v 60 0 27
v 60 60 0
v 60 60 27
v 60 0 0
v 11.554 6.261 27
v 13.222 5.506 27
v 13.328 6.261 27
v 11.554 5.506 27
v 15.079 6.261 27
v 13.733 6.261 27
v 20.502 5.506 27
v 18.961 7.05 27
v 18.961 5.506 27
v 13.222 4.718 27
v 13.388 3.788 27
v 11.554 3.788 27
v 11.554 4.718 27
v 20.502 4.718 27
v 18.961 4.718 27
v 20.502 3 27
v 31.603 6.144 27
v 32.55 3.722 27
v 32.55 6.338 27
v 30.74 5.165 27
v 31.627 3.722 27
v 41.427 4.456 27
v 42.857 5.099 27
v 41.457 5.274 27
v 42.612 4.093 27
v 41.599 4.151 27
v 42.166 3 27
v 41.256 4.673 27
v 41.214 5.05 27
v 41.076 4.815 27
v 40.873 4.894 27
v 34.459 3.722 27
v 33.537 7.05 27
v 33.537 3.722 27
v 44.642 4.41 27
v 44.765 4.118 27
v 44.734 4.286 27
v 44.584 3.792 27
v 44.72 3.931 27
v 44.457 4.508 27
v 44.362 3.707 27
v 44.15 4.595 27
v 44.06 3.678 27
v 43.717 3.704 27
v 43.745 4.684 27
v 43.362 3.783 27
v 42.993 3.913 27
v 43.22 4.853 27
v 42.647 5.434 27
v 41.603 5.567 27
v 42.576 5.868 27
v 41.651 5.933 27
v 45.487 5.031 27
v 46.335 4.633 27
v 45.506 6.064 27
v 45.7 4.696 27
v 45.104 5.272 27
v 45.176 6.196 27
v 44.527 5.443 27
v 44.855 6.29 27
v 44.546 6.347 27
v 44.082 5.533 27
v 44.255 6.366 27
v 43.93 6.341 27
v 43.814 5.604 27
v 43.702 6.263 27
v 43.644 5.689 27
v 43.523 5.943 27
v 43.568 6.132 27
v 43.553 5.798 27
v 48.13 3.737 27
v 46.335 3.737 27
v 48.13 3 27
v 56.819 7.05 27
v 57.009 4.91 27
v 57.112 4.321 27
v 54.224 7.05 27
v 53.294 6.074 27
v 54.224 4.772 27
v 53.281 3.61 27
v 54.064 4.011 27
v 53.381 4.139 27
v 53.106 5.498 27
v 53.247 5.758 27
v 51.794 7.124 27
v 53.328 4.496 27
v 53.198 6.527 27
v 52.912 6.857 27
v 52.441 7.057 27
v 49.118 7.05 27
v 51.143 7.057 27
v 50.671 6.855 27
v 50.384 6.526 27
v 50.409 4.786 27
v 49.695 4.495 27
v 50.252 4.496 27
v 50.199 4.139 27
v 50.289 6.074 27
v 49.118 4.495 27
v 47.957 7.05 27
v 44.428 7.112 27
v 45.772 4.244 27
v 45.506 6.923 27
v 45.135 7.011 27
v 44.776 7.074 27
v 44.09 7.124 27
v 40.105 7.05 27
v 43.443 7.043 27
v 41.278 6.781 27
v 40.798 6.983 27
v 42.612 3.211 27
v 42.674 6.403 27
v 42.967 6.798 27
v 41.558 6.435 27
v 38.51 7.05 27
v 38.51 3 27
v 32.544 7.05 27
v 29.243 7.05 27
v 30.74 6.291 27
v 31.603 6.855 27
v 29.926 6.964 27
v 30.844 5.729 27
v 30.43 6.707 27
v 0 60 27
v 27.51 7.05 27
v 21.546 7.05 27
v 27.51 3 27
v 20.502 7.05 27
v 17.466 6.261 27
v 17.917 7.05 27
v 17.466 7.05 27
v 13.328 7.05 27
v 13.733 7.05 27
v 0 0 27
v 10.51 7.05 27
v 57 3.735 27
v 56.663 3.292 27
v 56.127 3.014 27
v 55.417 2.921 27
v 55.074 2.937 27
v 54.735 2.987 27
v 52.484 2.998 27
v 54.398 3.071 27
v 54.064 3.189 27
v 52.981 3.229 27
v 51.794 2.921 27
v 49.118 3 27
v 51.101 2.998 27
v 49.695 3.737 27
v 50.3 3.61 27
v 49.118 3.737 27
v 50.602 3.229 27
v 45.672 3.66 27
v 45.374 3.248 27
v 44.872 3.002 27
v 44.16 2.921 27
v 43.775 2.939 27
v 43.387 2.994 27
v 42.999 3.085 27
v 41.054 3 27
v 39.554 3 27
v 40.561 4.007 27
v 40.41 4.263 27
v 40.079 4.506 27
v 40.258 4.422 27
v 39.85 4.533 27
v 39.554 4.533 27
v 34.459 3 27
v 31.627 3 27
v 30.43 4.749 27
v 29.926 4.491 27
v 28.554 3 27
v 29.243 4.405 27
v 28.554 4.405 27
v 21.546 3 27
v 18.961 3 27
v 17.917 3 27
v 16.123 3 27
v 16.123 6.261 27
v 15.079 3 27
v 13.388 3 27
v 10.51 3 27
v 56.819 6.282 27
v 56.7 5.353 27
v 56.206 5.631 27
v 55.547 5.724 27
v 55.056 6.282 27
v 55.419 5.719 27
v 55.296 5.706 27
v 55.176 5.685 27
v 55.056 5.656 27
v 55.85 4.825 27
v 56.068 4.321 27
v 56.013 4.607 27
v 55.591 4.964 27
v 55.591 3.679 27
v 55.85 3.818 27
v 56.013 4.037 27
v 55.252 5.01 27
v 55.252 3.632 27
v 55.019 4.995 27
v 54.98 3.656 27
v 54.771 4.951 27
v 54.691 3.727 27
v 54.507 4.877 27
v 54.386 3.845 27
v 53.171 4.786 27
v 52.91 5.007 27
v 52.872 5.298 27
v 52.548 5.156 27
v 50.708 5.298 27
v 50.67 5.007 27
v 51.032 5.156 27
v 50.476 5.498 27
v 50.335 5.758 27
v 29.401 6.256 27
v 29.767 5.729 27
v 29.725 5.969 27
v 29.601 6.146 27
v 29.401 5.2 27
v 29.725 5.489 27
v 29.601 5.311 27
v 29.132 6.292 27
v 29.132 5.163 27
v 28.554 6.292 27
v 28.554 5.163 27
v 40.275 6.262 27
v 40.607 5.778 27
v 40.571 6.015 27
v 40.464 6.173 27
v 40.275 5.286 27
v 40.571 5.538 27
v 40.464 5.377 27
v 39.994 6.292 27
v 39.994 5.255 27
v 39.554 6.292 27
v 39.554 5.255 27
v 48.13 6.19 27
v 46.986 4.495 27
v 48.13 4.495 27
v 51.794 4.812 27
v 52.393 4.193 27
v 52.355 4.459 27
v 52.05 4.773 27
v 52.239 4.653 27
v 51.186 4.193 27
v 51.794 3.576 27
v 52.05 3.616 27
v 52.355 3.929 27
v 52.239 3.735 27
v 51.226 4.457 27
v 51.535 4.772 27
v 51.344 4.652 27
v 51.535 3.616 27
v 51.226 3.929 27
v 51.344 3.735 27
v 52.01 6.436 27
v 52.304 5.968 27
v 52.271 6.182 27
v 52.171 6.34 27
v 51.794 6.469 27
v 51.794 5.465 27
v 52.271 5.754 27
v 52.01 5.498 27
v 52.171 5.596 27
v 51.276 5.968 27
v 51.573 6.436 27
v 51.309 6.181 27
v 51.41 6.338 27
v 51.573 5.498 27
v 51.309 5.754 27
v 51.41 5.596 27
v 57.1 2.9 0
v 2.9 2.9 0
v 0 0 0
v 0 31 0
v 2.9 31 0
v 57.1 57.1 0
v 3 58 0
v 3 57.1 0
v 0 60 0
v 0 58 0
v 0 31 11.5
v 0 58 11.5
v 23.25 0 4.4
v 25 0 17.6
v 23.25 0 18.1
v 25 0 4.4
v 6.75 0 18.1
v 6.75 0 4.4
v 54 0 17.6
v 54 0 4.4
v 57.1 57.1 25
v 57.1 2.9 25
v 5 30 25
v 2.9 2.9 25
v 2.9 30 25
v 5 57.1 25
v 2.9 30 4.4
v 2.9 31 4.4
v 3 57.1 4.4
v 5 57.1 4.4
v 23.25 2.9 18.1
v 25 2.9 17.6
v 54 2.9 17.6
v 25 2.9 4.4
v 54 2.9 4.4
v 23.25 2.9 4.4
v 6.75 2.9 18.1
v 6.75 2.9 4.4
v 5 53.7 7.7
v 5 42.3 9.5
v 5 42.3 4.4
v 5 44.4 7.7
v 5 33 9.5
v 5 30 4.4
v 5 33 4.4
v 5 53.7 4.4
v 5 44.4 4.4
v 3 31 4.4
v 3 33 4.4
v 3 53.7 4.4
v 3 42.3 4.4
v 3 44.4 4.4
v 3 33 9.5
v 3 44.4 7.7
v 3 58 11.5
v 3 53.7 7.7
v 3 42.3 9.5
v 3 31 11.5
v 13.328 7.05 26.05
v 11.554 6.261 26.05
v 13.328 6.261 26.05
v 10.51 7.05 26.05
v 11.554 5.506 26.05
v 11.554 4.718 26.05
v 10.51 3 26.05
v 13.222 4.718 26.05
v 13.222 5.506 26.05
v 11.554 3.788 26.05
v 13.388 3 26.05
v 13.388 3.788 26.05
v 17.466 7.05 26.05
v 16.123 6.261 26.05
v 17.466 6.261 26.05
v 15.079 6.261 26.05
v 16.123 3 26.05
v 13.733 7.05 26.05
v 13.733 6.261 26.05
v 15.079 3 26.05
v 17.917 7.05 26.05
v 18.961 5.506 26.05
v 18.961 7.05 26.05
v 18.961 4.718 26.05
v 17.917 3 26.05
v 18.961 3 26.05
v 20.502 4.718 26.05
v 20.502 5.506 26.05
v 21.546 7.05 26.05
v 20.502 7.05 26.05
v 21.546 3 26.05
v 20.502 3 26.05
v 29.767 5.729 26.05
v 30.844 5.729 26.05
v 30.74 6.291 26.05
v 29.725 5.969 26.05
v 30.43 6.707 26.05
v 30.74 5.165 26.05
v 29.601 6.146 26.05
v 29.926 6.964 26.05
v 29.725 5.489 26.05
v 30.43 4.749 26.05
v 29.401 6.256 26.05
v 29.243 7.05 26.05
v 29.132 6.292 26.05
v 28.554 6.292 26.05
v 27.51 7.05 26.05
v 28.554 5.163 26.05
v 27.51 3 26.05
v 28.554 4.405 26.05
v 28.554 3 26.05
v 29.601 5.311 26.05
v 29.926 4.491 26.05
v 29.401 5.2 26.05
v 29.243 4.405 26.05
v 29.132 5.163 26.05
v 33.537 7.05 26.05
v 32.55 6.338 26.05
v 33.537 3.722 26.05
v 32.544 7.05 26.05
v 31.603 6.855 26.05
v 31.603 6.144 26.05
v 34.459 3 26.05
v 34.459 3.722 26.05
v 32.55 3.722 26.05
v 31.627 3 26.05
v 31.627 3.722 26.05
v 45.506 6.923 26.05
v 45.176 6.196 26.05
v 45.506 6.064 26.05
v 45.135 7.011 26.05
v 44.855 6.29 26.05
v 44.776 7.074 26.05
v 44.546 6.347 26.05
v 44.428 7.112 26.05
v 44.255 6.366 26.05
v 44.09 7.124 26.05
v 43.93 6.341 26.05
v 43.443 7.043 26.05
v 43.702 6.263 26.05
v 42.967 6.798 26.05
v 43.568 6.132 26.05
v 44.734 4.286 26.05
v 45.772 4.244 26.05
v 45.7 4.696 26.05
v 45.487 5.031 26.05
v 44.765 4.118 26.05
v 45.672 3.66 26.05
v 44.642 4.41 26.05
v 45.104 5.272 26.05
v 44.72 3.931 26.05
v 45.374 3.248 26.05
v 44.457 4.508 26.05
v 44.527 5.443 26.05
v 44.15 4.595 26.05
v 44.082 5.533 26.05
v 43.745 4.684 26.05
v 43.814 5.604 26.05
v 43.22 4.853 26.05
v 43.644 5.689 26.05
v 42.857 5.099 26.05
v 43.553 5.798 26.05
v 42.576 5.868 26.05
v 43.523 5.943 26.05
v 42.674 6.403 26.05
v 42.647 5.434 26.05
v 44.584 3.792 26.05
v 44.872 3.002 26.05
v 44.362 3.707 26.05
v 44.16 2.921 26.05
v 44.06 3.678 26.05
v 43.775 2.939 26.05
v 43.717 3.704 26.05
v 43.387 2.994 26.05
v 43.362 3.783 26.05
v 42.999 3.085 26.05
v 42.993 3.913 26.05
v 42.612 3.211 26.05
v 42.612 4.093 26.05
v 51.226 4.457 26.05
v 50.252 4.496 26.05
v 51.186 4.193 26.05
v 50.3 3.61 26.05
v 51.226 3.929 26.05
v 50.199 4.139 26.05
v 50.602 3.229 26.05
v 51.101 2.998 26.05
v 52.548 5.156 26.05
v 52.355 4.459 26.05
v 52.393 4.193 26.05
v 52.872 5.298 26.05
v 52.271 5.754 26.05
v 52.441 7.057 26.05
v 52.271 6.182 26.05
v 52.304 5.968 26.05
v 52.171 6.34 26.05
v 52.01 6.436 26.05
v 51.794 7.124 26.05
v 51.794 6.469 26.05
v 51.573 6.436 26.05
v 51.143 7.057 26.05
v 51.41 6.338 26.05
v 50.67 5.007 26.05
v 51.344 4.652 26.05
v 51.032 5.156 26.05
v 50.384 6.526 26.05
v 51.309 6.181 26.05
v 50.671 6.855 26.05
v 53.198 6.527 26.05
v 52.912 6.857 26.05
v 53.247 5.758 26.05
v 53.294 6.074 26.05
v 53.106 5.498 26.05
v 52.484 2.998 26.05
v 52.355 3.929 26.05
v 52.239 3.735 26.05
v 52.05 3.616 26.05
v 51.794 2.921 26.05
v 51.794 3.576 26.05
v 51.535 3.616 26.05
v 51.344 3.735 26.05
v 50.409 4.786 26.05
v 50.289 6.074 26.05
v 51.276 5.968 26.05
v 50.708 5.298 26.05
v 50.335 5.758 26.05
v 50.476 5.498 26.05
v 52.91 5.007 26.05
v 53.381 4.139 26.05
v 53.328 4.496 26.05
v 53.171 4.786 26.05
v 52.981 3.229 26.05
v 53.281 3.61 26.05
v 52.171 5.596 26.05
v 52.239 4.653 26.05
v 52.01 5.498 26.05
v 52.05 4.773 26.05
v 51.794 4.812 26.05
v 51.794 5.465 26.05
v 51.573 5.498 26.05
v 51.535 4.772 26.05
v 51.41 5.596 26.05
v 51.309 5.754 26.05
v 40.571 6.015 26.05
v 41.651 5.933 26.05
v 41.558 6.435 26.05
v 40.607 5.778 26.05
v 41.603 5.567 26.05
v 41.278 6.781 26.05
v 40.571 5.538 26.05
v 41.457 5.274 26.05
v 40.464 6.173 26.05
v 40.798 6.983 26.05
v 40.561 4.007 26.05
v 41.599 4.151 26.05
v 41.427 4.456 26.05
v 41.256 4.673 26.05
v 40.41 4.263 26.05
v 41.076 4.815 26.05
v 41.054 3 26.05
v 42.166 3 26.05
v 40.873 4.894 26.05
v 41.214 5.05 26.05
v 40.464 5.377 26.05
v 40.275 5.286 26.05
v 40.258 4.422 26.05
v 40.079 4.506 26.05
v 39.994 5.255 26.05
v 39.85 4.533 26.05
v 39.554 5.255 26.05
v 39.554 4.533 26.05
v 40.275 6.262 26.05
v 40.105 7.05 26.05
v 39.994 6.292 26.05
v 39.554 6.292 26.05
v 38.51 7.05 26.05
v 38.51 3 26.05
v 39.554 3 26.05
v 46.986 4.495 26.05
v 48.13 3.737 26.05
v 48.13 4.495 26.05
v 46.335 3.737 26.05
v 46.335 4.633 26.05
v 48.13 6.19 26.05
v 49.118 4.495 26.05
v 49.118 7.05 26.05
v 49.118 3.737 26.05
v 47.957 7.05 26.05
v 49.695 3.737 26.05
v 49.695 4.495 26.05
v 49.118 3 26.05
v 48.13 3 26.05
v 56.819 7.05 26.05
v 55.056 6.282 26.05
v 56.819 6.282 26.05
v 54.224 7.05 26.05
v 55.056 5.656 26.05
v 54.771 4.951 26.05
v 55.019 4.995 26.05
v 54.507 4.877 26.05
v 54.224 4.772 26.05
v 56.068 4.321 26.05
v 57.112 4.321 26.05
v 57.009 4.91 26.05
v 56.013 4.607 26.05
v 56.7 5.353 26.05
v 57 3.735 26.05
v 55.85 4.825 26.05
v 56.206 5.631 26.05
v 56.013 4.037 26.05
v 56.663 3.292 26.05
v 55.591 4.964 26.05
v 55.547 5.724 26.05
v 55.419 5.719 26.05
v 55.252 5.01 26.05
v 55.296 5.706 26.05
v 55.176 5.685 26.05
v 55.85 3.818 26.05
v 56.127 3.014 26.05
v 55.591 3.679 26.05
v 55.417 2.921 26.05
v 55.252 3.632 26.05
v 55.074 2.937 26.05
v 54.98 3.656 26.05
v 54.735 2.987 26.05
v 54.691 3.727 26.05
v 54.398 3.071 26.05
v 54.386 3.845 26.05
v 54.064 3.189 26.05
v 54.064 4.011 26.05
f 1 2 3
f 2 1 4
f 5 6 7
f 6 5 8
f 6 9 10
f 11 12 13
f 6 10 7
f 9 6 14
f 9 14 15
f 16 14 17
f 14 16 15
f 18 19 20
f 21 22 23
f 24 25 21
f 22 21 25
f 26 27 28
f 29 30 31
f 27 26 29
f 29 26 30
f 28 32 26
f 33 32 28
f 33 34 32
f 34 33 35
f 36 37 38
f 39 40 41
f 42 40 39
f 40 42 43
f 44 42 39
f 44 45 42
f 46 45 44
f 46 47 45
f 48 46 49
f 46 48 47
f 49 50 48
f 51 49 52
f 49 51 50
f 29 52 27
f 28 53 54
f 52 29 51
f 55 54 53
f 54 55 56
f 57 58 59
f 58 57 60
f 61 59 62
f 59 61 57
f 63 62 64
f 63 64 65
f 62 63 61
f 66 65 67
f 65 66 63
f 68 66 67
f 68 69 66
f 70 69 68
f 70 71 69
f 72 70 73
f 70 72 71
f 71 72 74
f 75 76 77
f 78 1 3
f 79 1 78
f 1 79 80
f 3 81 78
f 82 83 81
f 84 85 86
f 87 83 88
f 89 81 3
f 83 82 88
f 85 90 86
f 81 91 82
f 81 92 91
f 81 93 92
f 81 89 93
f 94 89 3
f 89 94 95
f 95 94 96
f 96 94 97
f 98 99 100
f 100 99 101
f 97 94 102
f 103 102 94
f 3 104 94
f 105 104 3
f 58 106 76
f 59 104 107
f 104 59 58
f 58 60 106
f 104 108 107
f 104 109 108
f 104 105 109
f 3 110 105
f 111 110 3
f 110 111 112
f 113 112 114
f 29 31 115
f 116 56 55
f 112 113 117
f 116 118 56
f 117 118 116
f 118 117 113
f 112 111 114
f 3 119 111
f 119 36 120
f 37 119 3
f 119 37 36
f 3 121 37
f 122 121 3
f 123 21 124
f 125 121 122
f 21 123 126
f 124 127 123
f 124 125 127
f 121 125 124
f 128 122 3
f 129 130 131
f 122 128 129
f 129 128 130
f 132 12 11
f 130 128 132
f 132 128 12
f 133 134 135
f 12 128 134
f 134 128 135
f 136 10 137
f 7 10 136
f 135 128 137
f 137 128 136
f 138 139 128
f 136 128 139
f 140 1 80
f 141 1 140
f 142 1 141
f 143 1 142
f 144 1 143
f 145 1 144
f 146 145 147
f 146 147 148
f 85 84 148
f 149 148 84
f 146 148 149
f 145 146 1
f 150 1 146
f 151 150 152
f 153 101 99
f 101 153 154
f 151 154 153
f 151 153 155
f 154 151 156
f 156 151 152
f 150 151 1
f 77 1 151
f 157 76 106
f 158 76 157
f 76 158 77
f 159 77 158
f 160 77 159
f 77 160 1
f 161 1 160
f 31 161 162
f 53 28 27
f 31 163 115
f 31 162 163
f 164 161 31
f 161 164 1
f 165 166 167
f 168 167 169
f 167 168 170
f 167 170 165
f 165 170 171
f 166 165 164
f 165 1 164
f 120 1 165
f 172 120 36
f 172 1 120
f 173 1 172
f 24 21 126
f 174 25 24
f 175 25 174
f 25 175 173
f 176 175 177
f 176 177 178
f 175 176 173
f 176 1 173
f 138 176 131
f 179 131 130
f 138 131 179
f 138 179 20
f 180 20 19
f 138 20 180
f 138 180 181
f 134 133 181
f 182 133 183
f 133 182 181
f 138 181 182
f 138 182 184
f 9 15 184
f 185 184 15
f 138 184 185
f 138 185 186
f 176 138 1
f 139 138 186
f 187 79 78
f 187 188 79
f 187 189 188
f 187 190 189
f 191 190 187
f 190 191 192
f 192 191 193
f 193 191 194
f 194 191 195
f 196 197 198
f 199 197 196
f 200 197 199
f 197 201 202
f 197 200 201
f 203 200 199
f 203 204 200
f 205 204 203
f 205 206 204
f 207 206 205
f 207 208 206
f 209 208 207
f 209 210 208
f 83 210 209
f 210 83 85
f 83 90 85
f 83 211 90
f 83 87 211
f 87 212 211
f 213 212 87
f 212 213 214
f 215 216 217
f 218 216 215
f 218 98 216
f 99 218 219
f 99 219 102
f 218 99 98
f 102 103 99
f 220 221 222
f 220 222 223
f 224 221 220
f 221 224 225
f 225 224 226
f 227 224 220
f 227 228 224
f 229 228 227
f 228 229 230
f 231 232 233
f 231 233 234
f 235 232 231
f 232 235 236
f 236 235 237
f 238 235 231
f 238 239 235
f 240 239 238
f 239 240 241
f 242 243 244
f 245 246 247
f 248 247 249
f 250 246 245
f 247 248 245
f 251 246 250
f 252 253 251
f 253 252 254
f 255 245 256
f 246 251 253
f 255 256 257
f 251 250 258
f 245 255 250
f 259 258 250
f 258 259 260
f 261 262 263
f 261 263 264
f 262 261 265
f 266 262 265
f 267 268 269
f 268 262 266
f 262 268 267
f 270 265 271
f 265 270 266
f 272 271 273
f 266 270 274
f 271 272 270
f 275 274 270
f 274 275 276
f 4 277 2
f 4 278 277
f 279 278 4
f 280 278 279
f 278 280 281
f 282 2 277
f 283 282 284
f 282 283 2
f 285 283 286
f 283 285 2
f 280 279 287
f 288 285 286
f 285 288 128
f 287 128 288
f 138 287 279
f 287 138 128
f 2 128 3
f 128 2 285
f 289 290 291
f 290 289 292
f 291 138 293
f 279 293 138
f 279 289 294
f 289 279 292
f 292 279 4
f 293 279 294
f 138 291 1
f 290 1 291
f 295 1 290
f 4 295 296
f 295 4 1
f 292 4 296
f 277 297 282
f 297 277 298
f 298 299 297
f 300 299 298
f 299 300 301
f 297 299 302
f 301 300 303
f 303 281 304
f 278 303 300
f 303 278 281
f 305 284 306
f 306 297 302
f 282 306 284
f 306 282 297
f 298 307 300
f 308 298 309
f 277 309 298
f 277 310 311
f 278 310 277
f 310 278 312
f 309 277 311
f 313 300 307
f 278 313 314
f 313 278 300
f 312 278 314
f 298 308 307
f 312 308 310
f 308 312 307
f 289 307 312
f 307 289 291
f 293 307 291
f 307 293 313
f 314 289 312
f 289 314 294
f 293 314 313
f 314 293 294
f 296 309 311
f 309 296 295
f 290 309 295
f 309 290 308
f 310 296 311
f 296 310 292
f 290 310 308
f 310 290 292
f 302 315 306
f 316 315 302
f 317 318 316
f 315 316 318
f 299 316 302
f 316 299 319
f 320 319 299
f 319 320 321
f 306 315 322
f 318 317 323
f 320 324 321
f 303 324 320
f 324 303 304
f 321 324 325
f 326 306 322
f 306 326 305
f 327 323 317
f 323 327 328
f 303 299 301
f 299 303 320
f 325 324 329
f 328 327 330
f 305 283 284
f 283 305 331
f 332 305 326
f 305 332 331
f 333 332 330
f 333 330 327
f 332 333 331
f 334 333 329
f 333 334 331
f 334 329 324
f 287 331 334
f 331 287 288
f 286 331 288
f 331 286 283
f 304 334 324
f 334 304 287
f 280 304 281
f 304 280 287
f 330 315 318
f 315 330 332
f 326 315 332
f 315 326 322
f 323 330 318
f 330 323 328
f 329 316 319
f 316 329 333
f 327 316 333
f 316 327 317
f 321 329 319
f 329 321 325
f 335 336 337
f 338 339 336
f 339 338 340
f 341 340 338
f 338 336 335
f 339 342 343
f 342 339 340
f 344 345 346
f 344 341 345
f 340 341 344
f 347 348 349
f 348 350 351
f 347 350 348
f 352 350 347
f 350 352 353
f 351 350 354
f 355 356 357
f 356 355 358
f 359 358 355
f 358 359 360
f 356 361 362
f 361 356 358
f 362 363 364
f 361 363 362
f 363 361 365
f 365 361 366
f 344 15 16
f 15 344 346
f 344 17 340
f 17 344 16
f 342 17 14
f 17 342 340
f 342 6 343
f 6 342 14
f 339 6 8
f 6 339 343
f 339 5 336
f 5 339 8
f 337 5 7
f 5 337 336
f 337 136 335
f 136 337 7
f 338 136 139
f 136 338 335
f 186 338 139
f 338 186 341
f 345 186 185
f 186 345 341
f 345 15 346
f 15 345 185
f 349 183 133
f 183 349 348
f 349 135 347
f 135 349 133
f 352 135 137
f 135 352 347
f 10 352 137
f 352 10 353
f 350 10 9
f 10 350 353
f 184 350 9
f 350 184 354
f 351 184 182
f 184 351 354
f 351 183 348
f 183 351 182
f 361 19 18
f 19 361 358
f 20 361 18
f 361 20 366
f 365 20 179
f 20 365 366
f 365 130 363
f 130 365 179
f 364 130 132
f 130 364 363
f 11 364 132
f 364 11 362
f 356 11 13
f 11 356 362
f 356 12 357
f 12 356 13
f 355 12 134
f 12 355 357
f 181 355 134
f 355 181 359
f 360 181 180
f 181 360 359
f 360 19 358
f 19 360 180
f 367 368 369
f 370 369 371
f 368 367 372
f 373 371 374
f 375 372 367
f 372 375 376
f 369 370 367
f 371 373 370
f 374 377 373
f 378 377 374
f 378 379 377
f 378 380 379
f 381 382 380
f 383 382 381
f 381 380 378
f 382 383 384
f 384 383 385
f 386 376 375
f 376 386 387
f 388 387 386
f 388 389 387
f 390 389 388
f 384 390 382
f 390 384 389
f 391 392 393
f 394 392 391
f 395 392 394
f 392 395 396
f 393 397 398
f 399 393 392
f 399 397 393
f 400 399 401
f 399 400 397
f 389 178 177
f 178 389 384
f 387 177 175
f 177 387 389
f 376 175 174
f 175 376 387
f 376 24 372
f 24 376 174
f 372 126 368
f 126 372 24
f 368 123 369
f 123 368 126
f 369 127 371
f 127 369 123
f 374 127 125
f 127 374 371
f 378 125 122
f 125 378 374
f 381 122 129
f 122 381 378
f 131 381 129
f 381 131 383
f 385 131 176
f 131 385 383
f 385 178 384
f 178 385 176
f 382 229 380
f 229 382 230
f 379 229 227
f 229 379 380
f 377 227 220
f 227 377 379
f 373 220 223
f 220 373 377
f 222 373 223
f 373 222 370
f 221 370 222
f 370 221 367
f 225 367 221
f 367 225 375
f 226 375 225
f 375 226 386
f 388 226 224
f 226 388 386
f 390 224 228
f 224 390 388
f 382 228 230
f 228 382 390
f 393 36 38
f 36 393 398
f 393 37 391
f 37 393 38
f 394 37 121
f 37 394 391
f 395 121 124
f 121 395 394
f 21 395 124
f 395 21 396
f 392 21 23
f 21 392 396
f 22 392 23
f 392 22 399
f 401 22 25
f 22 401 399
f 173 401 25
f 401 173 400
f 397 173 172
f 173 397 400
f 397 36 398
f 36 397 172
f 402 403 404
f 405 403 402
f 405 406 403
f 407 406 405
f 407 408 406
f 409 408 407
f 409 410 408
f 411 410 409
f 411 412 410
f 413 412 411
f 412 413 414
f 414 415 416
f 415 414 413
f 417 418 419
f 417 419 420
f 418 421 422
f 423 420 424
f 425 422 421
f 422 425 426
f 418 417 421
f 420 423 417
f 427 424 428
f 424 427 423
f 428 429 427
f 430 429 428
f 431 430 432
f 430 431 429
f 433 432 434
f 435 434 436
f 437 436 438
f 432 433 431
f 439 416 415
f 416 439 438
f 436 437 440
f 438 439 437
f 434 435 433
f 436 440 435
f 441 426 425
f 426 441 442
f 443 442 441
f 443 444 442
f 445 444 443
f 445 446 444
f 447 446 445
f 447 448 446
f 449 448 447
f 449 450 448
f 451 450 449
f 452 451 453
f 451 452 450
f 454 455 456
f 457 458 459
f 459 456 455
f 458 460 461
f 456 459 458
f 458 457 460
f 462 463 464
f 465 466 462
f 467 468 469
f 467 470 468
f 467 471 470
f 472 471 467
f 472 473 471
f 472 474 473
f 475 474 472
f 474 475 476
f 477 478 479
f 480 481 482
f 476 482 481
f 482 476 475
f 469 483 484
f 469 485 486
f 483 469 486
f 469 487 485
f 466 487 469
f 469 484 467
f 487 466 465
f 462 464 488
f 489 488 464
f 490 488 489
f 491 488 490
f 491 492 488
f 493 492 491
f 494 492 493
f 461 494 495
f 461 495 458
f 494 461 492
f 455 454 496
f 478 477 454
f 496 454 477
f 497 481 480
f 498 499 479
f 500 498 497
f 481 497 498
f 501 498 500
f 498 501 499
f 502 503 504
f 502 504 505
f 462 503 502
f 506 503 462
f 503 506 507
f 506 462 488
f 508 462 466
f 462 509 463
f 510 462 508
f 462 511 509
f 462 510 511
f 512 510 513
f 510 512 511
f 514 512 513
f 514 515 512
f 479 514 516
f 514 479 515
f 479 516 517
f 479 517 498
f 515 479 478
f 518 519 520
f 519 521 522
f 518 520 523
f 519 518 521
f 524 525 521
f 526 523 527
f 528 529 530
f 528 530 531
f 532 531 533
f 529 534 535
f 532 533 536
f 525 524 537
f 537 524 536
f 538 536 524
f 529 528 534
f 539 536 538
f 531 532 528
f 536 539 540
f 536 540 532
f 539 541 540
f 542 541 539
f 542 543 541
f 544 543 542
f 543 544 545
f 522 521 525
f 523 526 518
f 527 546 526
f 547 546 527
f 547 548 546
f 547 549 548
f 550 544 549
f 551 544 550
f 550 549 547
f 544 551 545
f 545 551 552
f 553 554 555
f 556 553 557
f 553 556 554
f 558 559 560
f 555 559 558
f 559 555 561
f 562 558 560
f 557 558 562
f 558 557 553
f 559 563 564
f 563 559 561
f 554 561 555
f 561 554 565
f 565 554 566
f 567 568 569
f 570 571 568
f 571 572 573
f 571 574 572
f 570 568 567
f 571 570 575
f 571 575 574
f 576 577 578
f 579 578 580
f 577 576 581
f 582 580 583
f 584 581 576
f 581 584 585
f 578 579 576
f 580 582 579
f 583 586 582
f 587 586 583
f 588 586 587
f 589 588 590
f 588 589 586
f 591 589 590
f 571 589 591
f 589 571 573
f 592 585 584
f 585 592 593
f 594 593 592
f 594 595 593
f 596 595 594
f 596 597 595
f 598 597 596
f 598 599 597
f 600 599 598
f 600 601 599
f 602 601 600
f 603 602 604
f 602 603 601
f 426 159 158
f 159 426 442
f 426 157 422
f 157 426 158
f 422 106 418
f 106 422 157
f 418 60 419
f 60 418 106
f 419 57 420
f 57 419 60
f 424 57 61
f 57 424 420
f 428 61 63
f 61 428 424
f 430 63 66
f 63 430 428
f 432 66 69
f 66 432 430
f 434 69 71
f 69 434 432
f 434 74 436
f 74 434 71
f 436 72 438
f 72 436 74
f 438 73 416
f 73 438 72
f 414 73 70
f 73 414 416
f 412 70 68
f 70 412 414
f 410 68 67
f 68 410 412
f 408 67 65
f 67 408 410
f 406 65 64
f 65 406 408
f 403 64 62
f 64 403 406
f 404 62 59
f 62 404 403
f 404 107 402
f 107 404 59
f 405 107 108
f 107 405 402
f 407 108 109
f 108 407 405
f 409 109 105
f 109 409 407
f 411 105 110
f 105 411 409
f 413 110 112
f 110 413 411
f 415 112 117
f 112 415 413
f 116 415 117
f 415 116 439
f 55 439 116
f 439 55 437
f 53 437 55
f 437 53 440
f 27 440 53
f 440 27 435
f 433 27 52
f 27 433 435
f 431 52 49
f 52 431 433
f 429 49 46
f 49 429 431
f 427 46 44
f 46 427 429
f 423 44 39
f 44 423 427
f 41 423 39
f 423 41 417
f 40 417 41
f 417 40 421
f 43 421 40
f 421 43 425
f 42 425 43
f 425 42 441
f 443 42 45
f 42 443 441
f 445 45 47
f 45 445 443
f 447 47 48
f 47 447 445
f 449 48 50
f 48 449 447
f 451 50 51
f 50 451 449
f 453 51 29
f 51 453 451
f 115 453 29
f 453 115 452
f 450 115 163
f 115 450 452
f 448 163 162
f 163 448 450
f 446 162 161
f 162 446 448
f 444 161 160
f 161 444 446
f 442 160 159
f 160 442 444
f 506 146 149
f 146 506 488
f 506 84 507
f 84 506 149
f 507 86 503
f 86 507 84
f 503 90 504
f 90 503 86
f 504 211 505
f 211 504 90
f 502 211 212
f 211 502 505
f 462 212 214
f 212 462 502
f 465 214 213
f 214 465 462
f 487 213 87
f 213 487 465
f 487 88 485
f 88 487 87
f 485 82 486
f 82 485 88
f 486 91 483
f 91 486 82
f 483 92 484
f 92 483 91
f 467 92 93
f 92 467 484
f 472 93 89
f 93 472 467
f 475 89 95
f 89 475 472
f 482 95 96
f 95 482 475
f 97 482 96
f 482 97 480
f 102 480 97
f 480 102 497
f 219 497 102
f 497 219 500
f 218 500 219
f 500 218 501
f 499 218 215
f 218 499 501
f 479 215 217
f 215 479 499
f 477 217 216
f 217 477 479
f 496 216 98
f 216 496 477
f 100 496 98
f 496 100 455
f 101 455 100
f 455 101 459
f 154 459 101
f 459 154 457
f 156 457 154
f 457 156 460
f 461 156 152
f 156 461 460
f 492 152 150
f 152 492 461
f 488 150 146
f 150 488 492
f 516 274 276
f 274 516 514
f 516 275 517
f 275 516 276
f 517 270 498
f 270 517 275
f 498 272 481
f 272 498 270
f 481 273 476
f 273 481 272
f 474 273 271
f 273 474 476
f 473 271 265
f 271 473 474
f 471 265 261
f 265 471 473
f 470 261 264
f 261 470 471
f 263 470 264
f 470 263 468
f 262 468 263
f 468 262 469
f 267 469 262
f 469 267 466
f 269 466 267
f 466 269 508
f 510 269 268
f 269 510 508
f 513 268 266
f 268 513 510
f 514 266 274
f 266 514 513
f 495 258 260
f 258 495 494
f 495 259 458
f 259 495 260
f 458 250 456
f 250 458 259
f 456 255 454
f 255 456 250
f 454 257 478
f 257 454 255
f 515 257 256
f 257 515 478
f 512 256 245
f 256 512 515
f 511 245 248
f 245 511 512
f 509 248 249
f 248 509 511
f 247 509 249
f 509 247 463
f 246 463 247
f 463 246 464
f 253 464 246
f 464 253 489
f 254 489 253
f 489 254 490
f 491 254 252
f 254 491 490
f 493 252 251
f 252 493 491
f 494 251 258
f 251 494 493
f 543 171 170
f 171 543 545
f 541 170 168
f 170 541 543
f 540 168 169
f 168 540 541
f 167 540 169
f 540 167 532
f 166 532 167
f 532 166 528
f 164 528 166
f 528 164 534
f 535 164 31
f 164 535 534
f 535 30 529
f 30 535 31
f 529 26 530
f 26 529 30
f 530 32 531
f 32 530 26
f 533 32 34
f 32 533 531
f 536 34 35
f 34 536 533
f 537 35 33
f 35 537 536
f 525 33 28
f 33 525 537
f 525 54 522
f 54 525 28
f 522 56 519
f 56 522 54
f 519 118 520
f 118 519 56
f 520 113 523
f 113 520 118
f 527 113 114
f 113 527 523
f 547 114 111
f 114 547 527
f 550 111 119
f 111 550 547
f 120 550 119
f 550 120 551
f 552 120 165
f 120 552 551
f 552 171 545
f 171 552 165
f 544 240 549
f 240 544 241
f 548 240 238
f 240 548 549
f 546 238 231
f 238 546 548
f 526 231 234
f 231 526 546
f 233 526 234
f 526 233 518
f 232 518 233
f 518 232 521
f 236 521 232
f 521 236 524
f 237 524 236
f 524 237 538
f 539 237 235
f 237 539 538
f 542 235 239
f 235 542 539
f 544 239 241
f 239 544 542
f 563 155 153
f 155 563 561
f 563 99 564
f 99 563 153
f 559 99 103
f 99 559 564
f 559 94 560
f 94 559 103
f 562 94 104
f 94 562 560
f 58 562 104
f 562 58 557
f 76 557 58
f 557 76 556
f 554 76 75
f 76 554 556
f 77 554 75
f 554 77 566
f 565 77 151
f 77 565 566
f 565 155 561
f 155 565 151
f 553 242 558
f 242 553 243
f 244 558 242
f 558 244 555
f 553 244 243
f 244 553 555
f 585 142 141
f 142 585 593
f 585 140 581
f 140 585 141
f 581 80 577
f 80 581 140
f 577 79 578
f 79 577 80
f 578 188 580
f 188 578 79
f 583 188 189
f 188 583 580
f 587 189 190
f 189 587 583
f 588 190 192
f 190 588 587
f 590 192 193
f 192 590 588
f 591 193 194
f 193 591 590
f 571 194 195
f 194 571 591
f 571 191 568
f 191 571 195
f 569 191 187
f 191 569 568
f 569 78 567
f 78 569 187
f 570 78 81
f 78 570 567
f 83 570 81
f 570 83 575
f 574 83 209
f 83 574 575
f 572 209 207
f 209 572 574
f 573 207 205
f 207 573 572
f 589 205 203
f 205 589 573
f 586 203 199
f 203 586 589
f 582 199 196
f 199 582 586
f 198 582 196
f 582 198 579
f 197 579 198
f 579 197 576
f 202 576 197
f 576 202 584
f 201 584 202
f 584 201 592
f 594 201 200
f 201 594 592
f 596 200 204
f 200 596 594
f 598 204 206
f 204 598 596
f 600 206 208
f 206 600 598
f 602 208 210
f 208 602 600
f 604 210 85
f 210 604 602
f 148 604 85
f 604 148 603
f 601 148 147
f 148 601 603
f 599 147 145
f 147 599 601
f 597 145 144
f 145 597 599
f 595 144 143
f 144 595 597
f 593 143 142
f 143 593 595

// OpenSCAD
height=27;
clearance=2.8;
pcbthick=1.6;

module textext(strt,h=1) {
    linear_extrude(h) {
    text(strt,4,font="Open Sans:style=Bold");
    }
}

difference() {
union() {
difference() {
cube([60, 60, height]);
translate([2.9, 2.9, 0])
cube([60-2.9*2, 60-2.9*2, height-2]);
translate([6.75, 0, 2.8+1.6])
cube([16.5, 5, 13.7]);
translate([34.5+5-29/2, 0, 2.8+1.6])
cube([29, 5, 13.2]);       
}
translate([0, 30, clearance+pcbthick])
cube([5, 30, height-(clearance+pcbthick)]);

}
translate([0, 31, 0])
cube([3, 27, 8.5+3]);
translate([0, 55-1.3-9.3, clearance+pcbthick-0.1])
cube([10, 9.3, 3.4]);
translate([0, 28+5, clearance+pcbthick-0.1])
cube([10, 9.3, 5.2]);
translate([10, 3, height-0.95])
textext("ETH");
translate([27, 3, height-0.95])
textext("P1");
translate([38, 3, height-0.95])
textext("RS485");
}
